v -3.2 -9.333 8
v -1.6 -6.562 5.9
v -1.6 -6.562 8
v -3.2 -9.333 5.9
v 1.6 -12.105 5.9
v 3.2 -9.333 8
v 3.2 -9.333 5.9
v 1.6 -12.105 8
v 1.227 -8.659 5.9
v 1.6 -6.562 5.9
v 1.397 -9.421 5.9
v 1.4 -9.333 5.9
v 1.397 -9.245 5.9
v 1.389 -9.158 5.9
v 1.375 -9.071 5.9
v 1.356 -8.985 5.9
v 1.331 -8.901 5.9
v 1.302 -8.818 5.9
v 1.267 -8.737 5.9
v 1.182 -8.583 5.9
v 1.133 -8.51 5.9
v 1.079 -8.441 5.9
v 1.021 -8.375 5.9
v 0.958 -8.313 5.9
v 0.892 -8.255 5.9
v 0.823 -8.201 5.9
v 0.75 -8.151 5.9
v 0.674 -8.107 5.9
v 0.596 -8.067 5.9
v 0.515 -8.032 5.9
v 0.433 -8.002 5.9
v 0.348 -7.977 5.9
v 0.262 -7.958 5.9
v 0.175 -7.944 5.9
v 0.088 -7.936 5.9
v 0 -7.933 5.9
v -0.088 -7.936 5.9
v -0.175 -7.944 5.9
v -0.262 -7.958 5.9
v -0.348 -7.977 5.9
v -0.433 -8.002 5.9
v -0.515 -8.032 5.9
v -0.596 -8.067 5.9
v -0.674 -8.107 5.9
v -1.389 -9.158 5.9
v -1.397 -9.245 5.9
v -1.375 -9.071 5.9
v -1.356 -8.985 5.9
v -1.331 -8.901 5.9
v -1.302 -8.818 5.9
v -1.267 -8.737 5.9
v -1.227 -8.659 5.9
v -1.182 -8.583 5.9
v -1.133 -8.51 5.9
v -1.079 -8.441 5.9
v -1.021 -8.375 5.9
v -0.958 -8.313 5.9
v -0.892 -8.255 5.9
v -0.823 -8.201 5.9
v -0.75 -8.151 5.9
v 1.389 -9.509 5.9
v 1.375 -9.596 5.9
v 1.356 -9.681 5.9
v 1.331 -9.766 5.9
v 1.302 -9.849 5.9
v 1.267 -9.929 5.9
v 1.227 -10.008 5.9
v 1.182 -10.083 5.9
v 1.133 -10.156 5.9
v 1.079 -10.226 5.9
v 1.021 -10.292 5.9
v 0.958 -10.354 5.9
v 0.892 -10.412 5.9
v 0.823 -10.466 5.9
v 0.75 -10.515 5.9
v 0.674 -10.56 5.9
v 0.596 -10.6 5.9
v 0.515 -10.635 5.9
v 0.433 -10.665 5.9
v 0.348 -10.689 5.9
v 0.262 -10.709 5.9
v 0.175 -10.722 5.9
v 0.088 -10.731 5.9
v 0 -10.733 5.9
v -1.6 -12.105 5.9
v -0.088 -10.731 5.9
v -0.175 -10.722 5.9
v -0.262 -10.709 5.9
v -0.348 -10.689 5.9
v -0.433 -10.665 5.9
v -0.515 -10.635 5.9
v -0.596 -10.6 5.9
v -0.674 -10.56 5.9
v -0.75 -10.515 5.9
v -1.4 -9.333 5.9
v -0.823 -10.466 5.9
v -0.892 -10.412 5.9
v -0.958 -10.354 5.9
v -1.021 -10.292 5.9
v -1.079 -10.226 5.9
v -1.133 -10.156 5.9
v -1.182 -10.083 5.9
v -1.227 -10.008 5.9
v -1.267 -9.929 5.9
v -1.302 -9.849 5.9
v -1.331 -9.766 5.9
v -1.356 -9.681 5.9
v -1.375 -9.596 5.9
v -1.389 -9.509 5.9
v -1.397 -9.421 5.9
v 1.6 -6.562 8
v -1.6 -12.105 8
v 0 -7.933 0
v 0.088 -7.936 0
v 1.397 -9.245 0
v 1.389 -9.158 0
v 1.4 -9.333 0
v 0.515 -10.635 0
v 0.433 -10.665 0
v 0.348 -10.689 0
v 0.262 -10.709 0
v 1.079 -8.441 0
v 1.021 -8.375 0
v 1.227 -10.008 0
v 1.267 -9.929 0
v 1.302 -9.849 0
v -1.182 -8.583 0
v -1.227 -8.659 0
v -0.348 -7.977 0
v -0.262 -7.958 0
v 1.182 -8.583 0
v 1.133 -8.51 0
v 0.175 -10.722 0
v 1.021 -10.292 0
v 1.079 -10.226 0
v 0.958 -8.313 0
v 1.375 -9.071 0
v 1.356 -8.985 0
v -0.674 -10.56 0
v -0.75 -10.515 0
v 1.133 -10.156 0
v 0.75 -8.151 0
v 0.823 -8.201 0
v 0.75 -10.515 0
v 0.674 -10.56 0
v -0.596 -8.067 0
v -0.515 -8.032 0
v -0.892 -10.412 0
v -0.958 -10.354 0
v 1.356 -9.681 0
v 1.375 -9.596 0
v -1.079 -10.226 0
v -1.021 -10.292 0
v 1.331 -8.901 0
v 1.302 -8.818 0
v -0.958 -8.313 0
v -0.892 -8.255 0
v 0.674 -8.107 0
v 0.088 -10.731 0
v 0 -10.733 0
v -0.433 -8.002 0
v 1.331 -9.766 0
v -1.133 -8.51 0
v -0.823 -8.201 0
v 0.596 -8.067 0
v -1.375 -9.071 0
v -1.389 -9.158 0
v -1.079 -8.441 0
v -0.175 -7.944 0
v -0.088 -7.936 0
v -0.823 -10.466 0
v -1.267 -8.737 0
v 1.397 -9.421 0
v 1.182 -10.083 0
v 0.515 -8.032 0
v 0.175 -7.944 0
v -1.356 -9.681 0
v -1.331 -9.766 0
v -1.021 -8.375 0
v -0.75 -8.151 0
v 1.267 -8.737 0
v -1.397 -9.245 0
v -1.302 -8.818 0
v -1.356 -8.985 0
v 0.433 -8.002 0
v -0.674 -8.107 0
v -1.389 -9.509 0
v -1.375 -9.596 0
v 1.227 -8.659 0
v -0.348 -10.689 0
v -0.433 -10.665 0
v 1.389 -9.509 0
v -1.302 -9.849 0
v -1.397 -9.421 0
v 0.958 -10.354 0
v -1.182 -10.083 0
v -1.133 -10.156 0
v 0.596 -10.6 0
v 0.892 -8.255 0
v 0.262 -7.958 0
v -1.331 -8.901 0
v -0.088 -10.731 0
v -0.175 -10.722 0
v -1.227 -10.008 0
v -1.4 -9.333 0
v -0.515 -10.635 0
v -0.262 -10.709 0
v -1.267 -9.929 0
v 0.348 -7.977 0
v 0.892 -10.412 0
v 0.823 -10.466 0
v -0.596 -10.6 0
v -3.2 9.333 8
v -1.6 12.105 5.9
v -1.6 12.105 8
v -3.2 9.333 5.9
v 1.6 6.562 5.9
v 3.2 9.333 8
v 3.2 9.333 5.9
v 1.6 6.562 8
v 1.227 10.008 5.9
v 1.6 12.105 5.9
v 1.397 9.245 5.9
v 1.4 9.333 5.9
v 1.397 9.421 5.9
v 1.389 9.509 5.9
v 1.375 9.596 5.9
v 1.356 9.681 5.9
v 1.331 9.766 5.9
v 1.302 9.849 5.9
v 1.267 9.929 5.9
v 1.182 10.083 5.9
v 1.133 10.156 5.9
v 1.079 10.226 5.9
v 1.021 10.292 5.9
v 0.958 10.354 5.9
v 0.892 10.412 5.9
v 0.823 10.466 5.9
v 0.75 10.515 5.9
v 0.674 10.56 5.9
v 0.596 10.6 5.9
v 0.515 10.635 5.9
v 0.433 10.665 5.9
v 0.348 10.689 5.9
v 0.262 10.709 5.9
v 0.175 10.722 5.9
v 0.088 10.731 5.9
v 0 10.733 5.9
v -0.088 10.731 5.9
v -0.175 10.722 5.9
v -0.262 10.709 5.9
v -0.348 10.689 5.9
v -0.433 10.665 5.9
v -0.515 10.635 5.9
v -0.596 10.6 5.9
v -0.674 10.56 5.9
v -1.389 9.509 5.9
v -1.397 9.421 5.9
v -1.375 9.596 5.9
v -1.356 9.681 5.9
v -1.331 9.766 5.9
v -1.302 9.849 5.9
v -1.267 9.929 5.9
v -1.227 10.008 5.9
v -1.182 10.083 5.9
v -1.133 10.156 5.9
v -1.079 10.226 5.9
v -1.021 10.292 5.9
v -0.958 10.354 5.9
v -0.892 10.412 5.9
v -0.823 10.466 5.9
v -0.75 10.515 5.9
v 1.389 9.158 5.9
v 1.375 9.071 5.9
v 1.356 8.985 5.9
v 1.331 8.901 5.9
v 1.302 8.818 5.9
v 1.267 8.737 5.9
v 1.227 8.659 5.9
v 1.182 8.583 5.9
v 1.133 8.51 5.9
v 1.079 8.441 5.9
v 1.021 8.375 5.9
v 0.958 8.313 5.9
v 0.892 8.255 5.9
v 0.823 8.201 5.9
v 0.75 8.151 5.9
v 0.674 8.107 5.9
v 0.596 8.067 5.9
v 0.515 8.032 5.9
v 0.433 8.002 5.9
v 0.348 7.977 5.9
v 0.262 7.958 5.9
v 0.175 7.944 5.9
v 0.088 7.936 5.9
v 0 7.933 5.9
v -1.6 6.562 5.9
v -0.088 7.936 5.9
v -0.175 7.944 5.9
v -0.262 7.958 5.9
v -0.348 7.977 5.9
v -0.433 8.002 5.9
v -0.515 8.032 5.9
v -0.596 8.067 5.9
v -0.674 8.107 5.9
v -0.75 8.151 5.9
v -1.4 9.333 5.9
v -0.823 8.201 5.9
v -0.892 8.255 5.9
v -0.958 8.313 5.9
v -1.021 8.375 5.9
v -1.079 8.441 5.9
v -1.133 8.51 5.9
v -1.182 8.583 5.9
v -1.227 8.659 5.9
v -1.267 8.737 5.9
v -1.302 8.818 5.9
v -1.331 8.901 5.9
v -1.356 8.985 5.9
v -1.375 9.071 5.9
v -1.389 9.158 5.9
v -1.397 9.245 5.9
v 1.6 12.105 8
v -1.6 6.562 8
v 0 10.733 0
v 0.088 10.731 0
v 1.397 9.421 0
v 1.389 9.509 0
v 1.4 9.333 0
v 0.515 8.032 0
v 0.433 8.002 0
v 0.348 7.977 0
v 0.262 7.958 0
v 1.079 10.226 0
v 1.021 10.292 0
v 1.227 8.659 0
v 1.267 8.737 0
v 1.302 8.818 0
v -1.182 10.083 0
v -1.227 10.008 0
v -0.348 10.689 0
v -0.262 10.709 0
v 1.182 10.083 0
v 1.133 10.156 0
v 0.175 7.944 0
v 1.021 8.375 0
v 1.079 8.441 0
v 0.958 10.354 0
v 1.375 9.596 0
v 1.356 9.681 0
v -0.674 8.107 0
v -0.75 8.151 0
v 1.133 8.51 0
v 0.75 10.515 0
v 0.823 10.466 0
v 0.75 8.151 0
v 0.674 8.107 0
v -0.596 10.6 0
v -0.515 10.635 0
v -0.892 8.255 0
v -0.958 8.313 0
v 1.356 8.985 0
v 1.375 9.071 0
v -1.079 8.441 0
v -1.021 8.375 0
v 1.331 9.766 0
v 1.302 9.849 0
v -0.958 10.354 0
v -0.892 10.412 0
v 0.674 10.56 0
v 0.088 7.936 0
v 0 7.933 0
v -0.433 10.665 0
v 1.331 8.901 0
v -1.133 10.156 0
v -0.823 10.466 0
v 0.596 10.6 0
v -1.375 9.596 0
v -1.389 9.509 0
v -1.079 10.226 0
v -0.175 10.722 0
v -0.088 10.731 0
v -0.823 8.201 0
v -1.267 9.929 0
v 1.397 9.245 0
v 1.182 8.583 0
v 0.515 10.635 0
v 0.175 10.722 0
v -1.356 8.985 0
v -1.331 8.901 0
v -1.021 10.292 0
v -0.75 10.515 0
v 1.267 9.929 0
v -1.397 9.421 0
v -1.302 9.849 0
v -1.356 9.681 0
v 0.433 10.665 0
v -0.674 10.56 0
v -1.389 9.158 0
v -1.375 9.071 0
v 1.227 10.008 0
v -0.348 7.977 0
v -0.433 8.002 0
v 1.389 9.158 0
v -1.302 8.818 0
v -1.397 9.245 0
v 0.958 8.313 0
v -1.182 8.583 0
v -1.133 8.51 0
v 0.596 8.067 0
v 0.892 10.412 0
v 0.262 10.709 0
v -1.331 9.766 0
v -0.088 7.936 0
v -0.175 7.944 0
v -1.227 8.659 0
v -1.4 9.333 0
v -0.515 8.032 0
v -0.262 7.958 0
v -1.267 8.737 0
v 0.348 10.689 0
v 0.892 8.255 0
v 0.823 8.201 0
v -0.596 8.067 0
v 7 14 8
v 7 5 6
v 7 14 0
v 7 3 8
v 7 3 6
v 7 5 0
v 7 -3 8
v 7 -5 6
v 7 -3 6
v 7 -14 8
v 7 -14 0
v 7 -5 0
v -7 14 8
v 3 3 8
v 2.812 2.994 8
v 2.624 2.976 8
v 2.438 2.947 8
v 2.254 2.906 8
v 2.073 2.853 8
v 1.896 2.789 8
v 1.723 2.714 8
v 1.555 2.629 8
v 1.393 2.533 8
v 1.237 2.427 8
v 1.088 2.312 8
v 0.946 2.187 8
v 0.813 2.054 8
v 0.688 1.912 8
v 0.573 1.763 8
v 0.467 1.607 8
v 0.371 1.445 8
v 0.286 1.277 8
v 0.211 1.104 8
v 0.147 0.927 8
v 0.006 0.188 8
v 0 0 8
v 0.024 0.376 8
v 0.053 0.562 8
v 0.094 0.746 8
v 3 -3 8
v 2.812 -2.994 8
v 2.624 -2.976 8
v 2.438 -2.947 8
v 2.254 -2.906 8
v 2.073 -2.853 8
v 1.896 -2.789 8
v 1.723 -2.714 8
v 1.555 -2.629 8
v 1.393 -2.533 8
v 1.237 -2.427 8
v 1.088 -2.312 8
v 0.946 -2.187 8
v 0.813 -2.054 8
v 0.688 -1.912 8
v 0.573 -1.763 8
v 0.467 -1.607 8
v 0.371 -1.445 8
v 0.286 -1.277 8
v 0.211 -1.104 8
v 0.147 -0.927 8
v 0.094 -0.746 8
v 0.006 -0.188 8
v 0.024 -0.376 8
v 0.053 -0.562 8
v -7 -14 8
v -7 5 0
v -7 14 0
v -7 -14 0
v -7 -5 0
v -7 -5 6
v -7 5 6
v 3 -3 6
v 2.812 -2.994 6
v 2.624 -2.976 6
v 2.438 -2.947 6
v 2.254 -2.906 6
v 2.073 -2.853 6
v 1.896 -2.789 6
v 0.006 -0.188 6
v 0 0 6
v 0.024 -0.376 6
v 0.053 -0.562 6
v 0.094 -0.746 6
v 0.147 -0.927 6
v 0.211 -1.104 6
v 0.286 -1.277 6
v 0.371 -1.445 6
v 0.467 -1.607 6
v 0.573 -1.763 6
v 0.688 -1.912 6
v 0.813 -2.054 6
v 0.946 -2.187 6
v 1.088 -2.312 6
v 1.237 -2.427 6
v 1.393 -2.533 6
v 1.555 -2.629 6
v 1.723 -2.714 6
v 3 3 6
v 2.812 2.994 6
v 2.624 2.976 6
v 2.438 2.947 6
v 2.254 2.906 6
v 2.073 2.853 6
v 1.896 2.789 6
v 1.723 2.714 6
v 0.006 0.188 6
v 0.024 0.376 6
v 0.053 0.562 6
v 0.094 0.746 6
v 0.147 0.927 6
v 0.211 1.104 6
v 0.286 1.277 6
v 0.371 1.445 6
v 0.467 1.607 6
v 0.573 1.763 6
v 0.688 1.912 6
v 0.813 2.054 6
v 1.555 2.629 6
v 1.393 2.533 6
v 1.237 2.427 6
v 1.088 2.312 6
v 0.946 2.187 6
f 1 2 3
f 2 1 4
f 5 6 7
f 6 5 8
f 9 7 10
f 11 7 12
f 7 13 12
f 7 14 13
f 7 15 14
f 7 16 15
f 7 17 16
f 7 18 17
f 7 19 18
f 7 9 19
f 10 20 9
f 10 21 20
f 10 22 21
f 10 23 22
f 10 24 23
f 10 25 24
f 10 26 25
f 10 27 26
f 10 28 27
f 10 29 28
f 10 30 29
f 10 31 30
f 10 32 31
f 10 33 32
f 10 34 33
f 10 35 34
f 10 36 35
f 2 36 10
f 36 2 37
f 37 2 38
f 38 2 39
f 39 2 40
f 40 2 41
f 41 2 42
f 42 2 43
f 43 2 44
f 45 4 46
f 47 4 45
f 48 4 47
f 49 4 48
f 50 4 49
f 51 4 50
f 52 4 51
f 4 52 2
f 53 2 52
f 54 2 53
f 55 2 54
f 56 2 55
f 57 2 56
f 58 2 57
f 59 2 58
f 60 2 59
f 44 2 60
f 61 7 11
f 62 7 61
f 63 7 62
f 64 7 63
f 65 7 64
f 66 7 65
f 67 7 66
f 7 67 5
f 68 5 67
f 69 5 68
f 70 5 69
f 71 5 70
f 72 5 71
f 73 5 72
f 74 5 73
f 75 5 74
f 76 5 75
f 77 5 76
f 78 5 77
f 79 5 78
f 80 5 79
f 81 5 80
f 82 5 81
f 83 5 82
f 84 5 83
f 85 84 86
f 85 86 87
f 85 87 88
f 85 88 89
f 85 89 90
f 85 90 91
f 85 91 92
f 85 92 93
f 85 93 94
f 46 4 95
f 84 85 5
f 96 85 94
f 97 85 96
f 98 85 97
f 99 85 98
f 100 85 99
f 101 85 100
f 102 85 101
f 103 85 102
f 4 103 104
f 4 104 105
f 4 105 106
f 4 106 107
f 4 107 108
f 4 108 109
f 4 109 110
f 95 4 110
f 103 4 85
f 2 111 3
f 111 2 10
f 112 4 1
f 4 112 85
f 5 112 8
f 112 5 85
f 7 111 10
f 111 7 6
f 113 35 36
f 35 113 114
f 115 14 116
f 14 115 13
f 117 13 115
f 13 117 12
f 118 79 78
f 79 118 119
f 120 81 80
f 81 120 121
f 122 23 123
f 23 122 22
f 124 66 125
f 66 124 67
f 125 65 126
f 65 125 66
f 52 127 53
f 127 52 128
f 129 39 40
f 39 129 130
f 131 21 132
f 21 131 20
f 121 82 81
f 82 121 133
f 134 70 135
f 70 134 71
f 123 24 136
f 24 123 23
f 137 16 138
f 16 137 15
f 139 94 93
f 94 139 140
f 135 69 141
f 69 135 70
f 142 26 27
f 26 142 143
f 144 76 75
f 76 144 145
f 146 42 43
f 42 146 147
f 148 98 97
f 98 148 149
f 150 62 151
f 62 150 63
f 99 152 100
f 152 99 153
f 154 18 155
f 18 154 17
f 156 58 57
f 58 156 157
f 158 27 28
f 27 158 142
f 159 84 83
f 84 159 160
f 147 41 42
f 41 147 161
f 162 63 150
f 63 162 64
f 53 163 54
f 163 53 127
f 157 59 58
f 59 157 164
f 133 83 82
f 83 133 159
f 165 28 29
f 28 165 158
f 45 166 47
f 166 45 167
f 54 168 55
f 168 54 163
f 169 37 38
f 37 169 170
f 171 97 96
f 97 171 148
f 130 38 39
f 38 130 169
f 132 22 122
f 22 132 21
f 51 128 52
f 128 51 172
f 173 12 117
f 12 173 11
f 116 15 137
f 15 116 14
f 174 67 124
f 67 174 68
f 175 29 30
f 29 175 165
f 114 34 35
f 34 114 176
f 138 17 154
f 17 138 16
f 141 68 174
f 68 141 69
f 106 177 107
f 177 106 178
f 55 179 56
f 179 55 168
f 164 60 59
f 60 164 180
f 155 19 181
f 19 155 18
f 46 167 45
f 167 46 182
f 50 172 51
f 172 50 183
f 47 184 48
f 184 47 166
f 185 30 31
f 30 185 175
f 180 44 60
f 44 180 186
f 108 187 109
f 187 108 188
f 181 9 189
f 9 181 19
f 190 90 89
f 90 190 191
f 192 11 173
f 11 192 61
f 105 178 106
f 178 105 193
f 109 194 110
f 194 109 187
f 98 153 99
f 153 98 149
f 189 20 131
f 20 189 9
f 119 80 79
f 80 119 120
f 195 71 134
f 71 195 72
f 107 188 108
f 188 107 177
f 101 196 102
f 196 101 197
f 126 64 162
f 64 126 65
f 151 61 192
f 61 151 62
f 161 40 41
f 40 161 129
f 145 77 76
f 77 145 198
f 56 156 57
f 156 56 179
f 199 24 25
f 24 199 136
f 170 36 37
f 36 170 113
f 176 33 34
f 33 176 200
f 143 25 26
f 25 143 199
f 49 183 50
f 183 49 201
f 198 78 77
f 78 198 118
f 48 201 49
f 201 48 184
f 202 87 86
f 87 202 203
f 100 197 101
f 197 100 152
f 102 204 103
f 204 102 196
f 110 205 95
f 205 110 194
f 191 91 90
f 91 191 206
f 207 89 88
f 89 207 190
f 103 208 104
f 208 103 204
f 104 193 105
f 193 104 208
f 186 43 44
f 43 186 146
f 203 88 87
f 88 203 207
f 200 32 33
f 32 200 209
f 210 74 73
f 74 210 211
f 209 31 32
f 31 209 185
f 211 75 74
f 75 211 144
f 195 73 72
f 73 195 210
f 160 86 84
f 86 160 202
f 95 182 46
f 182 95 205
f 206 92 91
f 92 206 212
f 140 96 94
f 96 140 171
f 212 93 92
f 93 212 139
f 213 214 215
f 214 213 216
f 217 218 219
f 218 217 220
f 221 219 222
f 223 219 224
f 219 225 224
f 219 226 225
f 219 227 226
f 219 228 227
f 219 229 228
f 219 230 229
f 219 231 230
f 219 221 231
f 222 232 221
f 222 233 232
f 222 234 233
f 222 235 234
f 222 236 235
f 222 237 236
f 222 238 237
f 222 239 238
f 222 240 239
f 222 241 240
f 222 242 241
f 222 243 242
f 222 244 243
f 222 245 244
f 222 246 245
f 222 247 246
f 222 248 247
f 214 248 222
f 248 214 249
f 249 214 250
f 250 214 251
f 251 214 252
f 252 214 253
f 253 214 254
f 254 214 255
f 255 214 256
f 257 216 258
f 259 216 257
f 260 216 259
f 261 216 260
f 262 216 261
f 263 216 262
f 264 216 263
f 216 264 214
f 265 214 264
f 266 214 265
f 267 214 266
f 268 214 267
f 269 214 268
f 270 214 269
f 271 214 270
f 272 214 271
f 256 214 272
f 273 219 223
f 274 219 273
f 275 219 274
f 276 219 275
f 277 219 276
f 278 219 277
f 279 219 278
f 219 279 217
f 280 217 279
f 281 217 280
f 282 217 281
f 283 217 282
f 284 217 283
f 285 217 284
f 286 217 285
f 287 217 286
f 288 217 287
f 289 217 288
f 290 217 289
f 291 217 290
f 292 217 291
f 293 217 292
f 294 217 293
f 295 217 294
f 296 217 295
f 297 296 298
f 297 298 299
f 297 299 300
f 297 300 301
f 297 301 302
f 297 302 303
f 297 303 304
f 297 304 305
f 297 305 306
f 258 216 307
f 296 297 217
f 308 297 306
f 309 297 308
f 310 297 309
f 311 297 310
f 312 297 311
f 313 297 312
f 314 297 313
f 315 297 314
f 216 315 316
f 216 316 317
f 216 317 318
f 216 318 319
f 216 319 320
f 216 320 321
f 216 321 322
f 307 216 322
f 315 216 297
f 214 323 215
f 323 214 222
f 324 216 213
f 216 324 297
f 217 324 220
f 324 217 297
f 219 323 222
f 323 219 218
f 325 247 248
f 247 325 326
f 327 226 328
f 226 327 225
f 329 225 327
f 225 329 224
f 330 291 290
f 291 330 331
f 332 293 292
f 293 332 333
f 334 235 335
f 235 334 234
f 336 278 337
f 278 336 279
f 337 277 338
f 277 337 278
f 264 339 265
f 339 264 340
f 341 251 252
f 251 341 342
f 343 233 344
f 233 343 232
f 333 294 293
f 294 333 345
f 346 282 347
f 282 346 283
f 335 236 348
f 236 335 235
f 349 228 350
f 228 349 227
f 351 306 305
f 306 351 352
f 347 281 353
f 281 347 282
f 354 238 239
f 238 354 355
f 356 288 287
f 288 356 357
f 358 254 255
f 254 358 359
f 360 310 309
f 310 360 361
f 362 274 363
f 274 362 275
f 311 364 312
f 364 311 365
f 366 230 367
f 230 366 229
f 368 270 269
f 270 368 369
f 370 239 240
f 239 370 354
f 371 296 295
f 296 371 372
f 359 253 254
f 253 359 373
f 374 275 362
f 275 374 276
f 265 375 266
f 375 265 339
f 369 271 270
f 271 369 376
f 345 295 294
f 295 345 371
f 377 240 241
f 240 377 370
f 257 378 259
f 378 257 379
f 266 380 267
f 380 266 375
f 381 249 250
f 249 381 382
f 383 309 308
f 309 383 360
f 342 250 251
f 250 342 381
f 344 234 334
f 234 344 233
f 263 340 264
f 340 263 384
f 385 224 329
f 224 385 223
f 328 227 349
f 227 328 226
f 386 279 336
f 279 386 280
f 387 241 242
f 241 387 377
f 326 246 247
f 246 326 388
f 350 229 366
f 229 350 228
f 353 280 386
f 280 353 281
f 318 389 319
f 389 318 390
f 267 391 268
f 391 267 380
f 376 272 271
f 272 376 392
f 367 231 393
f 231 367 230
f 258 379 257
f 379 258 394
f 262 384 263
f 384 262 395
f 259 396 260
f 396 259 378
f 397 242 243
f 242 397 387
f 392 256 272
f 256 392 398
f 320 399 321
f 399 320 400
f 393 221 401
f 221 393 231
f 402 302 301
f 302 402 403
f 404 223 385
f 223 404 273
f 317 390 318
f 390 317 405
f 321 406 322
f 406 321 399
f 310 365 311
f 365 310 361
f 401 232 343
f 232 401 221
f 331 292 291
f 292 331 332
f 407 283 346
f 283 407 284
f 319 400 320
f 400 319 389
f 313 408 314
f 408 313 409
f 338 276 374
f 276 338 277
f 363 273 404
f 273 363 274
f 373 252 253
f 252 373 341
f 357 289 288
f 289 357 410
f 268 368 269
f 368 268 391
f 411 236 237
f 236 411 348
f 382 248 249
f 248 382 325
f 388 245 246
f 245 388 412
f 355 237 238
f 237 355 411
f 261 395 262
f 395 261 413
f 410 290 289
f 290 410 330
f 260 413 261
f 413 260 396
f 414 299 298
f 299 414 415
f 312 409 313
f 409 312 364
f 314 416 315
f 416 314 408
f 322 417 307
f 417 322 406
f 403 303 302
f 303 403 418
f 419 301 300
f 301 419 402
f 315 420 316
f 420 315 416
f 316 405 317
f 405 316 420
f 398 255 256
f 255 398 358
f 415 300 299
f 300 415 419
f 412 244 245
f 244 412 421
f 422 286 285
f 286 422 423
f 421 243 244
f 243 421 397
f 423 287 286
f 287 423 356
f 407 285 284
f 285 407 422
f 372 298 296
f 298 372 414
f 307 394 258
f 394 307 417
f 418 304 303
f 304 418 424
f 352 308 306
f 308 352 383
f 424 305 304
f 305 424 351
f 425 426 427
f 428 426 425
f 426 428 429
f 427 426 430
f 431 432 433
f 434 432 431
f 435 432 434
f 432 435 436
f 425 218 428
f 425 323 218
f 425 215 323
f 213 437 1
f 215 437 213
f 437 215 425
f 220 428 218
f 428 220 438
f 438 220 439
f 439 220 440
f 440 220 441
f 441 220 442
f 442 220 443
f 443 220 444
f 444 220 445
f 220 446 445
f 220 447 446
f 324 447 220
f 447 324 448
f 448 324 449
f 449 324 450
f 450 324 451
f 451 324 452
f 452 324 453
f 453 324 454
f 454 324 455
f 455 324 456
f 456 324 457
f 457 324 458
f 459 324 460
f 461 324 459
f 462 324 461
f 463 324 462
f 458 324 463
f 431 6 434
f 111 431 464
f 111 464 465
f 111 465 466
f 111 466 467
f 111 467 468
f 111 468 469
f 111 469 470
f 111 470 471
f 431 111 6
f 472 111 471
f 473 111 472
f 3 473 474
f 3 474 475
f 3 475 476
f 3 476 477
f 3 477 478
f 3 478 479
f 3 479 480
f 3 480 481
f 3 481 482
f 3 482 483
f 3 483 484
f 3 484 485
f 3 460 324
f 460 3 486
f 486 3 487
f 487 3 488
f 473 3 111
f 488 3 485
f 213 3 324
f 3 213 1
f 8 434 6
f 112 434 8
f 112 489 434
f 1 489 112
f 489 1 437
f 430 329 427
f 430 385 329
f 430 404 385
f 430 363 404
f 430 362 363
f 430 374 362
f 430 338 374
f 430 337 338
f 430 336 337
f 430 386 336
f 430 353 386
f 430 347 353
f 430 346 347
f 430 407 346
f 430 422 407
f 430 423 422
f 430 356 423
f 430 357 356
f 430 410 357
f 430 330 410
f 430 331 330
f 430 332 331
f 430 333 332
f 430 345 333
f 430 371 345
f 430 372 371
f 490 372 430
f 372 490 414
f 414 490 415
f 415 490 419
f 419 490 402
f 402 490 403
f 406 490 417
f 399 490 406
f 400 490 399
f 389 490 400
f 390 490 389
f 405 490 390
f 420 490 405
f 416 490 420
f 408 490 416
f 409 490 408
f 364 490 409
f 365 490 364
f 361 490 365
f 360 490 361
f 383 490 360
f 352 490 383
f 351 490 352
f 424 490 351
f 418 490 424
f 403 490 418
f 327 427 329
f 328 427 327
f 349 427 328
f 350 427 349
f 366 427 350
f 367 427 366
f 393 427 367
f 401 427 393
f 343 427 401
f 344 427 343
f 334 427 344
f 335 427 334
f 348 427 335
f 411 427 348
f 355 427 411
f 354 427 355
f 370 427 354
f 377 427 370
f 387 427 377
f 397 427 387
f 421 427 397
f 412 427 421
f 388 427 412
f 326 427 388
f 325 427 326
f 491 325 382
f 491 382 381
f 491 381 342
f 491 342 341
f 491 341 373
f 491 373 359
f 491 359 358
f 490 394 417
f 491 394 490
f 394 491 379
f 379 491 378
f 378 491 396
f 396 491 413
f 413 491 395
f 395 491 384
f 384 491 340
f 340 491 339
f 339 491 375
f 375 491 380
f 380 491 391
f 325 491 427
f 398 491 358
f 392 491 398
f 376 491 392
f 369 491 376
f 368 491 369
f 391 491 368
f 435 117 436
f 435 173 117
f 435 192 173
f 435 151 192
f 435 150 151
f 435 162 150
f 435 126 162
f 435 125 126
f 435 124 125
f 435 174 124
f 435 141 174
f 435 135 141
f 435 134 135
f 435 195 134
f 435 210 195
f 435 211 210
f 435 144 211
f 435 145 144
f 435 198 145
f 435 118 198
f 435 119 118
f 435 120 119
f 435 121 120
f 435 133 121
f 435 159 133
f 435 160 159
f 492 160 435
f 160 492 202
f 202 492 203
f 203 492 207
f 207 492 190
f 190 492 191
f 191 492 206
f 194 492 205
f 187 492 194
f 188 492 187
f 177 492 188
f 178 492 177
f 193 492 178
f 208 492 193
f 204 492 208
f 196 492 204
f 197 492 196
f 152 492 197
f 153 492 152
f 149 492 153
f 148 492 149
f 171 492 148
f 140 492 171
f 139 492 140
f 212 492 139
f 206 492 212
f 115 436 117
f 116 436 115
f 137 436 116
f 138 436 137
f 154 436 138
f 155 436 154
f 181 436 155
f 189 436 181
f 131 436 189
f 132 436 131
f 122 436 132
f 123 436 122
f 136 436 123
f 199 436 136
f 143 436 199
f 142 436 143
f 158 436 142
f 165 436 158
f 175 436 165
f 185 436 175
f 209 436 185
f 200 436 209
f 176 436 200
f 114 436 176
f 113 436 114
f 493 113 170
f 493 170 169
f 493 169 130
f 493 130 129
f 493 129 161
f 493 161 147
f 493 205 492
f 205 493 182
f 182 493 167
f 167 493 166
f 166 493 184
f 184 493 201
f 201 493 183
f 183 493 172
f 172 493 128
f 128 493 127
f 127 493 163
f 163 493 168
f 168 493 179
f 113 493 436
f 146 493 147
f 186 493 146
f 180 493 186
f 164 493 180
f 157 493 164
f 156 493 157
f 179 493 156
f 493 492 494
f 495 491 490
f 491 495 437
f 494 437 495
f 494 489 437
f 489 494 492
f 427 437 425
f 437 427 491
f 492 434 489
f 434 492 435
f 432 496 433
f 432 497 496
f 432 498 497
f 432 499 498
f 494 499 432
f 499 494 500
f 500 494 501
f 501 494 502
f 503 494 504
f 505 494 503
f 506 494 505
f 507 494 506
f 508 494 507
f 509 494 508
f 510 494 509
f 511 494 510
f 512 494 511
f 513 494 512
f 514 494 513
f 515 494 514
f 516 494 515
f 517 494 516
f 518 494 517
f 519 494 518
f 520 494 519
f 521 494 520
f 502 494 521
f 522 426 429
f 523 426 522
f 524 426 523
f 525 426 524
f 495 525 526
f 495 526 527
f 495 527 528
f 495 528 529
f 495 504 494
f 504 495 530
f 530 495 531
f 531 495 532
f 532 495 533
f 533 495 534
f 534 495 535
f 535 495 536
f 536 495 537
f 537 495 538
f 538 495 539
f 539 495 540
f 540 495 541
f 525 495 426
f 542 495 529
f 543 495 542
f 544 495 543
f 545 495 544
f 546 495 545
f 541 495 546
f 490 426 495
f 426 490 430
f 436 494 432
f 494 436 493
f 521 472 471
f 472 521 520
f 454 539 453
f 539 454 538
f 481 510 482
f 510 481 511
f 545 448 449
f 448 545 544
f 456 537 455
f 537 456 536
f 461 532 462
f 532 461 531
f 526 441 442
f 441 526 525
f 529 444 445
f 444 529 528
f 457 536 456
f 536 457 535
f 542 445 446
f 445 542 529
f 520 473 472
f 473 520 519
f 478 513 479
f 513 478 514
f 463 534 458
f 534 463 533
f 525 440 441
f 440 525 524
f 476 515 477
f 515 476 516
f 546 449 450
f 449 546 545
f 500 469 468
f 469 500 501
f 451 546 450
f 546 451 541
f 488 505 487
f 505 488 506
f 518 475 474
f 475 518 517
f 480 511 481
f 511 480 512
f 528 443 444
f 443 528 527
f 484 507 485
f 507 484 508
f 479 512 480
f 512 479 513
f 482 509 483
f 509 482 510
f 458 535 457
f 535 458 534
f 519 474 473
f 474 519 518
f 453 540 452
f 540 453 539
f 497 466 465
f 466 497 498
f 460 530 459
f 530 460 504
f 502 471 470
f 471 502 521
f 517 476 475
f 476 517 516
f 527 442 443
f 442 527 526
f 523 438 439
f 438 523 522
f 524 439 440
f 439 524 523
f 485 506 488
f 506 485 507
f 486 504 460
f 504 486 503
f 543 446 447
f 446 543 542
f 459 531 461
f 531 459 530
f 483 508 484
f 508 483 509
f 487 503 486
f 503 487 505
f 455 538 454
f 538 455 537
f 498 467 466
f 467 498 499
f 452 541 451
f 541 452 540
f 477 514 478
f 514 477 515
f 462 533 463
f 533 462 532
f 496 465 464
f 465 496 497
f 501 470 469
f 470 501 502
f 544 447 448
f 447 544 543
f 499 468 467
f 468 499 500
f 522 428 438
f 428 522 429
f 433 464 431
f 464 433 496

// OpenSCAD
// file: ../lib/common.scad
module nut(n, h, r) {
    s = 360/n;
    linear_extrude(h) polygon([for (i = [0:n-1]) [r*cos(i*s), r*sin(i*s)]]);
}

module hexNut(h, r) {
    nut(6, h, r);
}

module hexNutM25(h = 2.2, r = 3.2) {
    hexNut(h, r);
}

module hexNutScrewM25(h, nutH = 2.2, screwD = 2.8) {
    hexNutM25(nutH);
    cylinder(h = h, d = screwD);
}

module gear(r, n, h) {
    s = 360/n/2;
    linear_extrude(h) polygon([for (i = [0:n*2-1]) [r[i%2]*cos(i*s), r[i%2]*sin(i*s)]]);
}

module bearBall(r = 3) {
    sphere(r);
}

hookBaseH = 4;  // base height of hook
hookBaseL = 4;  // length of hook
hookBaseD = 2;  // depth of hook
hookSizeH = 2;
hookSizeD = 2;

function makeHook(baseH, baseL = 4, baseD = 2, sizeH = 2, sizeD = 2) = [baseH, baseL, baseD, sizeH, sizeD];

module hook(params) {
    baseH = params[0];
    baseL = params[1];
    baseD = params[2];
    sizeH = params[3];
    sizeD = params[4];

    rotate([0, 90, 90]) translate([0, 0, -baseL/2])
    linear_extrude(height = baseL) polygon([
        [sizeH, 0],
        [0, -sizeD],
        [0, 0],
        [-baseH, 0],
        [-baseH, baseD],
        [sizeH, baseD]
    ]);
}

function hookLocTop(params) = [0, 0, -params[0]];
function hookLocL(params) = [0, params[1]/2, 0];
function hookLocR(params) = [0, -params[1]/2, 0];
function hookLocBack(params) = [params[2], 0, 0];
function hookLocBottom(params) = [0, 0, params[3]];
function hookLocFront(params) = [-params[4], 0, 0];
function hookLocMid(params) = [params[2]/2, 0, 0];
function hookLocBaseCenter(params) = [0, 0, -params[0]/2];

$fn = 100;

hexNutScrewM25(h = 5);
// file: ../lib/camera.scad
$fn = 100;

use <common.scad>;

// 32*32mm camera board

cam32BoardSz = 32;                      // the inner board size
cam32BoardT = 1.8;                      // board thickness, slightly thicker (1.62 actual)
cam32ScrewHoleD = 2.5;                  // screw hole dia on four corners
cam32ScrewHoleR = cam32ScrewHoleD/2;
cam32ScrewHoleEdgeDist = 1.1;           // distance from inner board edge to hole edge
cam32ScrewHoleCenterEdgeDist = cam32ScrewHoleEdgeDist + cam32ScrewHoleR; // distance from hole center to inner board edge
cam32ScrewHoleDist = 28;                // distance between centers of two holes
cam32ScrewHoleSuppSz = 1.2;             // extended support size outside of hole
cam32BackSuppSp = 2;                    // space between back support and board
cam32BackSuppH = 3;                     // default back support height, without space
cam32SuppH = cam32BackSuppH + cam32BackSuppSp;

module cam32ScrewHoleSupp(h = cam32SuppH) {
    outSz = cam32ScrewHoleD + (cam32ScrewHoleSuppSz+cam32ScrewHoleEdgeDist) * 2;
    inSz = cam32ScrewHoleD + cam32ScrewHoleEdgeDist * 2;
    translate([0, 0, (h - cam32BoardT)/2]) {
        difference() {
            cube([outSz, outSz, h + cam32BoardT], true);
            translate([-cam32ScrewHoleSuppSz, -cam32ScrewHoleSuppSz, -h/2-0.1])
                cube([outSz, outSz, cam32BoardT+0.2], true);
            translate([0, 0, (h+cam32BoardT)/2+0.1])
                    mirror([0, 0, 1]) 
            hexNutScrewM25(h = h+cam32BoardT+0.2, nutH = 2.3);
            
            // one edge will conflict with connector, shrink it
            translate([0, -inSz/2-(outSz-inSz)/4-0.5, 0])
            cube([outSz+0.2, (outSz-inSz)/2+0.2, h+cam32BoardT+0.2], true);
        }

    }
}

module cam32Supp(h = cam32SuppH) {
    outSz = cam32ScrewHoleD + (cam32ScrewHoleSuppSz+cam32ScrewHoleEdgeDist) * 2;
    inSz = cam32ScrewHoleD + cam32ScrewHoleEdgeDist * 2;
    off = cam32ScrewHoleDist/2;
    suppH = h - cam32BackSuppSp;
    connL = cam32ScrewHoleDist-outSz;
    difference() {
        union() {
            translate([off, off, 0]) cam32ScrewHoleSupp(h);
            translate([off, -off, 0]) mirror([0, -1, 0]) cam32ScrewHoleSupp(h);
            translate([-off, off, 0]) mirror([-1, 0, 0]) cam32ScrewHoleSupp(h);
            translate([-off, -off, 0]) mirror([-1, 0, 0]) mirror([0, -1, 0]) cam32ScrewHoleSupp(h);
            translate([0, off+(outSz-inSz)/4-0.2, suppH/2+cam32BackSuppSp]) cube([connL, (outSz+inSz)/2+0.4, suppH], true);
            translate([0, -off-(outSz-inSz)/4+0.2, suppH/2+cam32BackSuppSp]) cube([connL, (outSz+inSz)/2+0.4, suppH], true);
            translate([0, 0, suppH/2+cam32BackSuppSp]) cube([off, off*2, suppH], true);
        }
        translate([0, 0, cam32BackSuppSp-0.1]) {
            hexNutScrewM25(h = suppH + 0.2, nutH = 1.8);
            translate([0, -cam32ScrewHoleDist/3, 0])
                hexNutScrewM25(h = suppH + 0.2, nutH = 1.8);
            translate([0, cam32ScrewHoleDist/3, 0])
                hexNutScrewM25(h = suppH + 0.2, nutH = 1.8);            
        }
    }
}

cam32WireInD = 6;   // Inner dia of wire guide
cam32WireOutD = 10; // Outer dia of wire guide
cam32HookD = 4;
cam32HookL = 4;
cam32HookSzH = 0.6;
cam32HookSzD = 0.6;
cam32HookSp = 0.2;

module cam32WireGuide(h = cam32SuppH) {
    l = cam32ScrewHoleDist/2 + cam32HookD*2;
    cy = cam32WireInD + cam32HookL*2;
    hk = makeHook(
        baseH = h - cam32BackSuppSp + cam32HookSp, 
        baseL = cam32HookL,
        baseD = cam32HookD-cam32HookSp,
        sizeH = cam32HookSzH,
        sizeD = cam32HookSzD);
    translate([0, 0, cam32WireInD/2]) union() {
        difference() {
            union() {
                rotate([0, 90, 0]) cylinder(h = l, d = cam32WireOutD, center = true);
                translate([0, 0, -cam32WireInD/4]) cube([l, cy, cam32WireInD/2], true);
            }
            // erase everything below base
            translate([0, 0, -cam32WireOutD/2-cam32WireInD/2]) cube([l, cy, cam32WireOutD], true);
            // erase insider of guide
            rotate([0, 90, 0]) cylinder(h = l+0.2, d = cam32WireInD, center = true);
            translate([0, 0, -cam32WireInD/2]) cube([l+0.2, cam32WireInD, cam32WireInD], true);
            // make space in the upper middle for wiring out
            translate([cam32WireInD/2, 0, 0]) cylinder(h = cam32WireOutD+0.2, d = cam32WireInD, center = true);
            translate([l/2+cam32WireInD/2, 0, cam32WireOutD/2]) cube([l, cam32WireInD, cam32WireOutD], true);
            
        }
        // add hooks
        offx = cam32ScrewHoleDist/4+cam32HookSp;
        translate([0, 0, -cam32WireInD/2]) {
            translate([-offx, -cy/2, 0]+hookLocL(hk)+hookLocTop(hk)) hook(hk);
            translate([-offx, cy/2, 0]+hookLocR(hk)+hookLocTop(hk)) hook(hk);
            translate([offx, -cy/2, 0]+hookLocL(hk)+hookLocTop(hk)) mirror([1, 0, 0]) hook(hk);
            translate([offx, cy/2, 0]+hookLocR(hk)+hookLocTop(hk)) mirror([1, 0, 0]) hook(hk);
        }
    }
}

module cam32WireGuideFlat(h = cam32SuppH) {
    l = cam32ScrewHoleDist/2;
    cy = cam32ScrewHoleDist;
    hAll = cam32WireInD+cam32BackSuppSp;
    difference() {
        translate([0, 0, hAll/2]) cube([l, cy, hAll], true);
        translate([0, 0, cam32WireInD/2-0.1]) cube([l+0.2, cam32WireOutD, cam32WireInD+0.2], true);
        translate([cam32WireInD/2, 0, 0]) cylinder(h = hAll+0.1, d = cam32WireInD);
        translate([l/2+cam32WireInD/2, 0, hAll/2+0.1]) cube([l, cam32WireInD, hAll+0.2], true);
        // nut holes
        translate([0, 0, hAll+0.1]) {
            translate([0, -cam32ScrewHoleDist/3, 0])
                mirror([0, 0, 1]) hexNutScrewM25(h = hAll+0.2);
            translate([0, cam32ScrewHoleDist/3, 0])
                mirror([0, 0, 1]) hexNutScrewM25(h = hAll+0.2);            
        }
    }
}
    
cam32Supp();
translate([0, 0, cam32SuppH]) cam32WireGuide();
// main file
$fn = 360;

use <../lib/camera.scad>;

cam32WireGuideFlat();
